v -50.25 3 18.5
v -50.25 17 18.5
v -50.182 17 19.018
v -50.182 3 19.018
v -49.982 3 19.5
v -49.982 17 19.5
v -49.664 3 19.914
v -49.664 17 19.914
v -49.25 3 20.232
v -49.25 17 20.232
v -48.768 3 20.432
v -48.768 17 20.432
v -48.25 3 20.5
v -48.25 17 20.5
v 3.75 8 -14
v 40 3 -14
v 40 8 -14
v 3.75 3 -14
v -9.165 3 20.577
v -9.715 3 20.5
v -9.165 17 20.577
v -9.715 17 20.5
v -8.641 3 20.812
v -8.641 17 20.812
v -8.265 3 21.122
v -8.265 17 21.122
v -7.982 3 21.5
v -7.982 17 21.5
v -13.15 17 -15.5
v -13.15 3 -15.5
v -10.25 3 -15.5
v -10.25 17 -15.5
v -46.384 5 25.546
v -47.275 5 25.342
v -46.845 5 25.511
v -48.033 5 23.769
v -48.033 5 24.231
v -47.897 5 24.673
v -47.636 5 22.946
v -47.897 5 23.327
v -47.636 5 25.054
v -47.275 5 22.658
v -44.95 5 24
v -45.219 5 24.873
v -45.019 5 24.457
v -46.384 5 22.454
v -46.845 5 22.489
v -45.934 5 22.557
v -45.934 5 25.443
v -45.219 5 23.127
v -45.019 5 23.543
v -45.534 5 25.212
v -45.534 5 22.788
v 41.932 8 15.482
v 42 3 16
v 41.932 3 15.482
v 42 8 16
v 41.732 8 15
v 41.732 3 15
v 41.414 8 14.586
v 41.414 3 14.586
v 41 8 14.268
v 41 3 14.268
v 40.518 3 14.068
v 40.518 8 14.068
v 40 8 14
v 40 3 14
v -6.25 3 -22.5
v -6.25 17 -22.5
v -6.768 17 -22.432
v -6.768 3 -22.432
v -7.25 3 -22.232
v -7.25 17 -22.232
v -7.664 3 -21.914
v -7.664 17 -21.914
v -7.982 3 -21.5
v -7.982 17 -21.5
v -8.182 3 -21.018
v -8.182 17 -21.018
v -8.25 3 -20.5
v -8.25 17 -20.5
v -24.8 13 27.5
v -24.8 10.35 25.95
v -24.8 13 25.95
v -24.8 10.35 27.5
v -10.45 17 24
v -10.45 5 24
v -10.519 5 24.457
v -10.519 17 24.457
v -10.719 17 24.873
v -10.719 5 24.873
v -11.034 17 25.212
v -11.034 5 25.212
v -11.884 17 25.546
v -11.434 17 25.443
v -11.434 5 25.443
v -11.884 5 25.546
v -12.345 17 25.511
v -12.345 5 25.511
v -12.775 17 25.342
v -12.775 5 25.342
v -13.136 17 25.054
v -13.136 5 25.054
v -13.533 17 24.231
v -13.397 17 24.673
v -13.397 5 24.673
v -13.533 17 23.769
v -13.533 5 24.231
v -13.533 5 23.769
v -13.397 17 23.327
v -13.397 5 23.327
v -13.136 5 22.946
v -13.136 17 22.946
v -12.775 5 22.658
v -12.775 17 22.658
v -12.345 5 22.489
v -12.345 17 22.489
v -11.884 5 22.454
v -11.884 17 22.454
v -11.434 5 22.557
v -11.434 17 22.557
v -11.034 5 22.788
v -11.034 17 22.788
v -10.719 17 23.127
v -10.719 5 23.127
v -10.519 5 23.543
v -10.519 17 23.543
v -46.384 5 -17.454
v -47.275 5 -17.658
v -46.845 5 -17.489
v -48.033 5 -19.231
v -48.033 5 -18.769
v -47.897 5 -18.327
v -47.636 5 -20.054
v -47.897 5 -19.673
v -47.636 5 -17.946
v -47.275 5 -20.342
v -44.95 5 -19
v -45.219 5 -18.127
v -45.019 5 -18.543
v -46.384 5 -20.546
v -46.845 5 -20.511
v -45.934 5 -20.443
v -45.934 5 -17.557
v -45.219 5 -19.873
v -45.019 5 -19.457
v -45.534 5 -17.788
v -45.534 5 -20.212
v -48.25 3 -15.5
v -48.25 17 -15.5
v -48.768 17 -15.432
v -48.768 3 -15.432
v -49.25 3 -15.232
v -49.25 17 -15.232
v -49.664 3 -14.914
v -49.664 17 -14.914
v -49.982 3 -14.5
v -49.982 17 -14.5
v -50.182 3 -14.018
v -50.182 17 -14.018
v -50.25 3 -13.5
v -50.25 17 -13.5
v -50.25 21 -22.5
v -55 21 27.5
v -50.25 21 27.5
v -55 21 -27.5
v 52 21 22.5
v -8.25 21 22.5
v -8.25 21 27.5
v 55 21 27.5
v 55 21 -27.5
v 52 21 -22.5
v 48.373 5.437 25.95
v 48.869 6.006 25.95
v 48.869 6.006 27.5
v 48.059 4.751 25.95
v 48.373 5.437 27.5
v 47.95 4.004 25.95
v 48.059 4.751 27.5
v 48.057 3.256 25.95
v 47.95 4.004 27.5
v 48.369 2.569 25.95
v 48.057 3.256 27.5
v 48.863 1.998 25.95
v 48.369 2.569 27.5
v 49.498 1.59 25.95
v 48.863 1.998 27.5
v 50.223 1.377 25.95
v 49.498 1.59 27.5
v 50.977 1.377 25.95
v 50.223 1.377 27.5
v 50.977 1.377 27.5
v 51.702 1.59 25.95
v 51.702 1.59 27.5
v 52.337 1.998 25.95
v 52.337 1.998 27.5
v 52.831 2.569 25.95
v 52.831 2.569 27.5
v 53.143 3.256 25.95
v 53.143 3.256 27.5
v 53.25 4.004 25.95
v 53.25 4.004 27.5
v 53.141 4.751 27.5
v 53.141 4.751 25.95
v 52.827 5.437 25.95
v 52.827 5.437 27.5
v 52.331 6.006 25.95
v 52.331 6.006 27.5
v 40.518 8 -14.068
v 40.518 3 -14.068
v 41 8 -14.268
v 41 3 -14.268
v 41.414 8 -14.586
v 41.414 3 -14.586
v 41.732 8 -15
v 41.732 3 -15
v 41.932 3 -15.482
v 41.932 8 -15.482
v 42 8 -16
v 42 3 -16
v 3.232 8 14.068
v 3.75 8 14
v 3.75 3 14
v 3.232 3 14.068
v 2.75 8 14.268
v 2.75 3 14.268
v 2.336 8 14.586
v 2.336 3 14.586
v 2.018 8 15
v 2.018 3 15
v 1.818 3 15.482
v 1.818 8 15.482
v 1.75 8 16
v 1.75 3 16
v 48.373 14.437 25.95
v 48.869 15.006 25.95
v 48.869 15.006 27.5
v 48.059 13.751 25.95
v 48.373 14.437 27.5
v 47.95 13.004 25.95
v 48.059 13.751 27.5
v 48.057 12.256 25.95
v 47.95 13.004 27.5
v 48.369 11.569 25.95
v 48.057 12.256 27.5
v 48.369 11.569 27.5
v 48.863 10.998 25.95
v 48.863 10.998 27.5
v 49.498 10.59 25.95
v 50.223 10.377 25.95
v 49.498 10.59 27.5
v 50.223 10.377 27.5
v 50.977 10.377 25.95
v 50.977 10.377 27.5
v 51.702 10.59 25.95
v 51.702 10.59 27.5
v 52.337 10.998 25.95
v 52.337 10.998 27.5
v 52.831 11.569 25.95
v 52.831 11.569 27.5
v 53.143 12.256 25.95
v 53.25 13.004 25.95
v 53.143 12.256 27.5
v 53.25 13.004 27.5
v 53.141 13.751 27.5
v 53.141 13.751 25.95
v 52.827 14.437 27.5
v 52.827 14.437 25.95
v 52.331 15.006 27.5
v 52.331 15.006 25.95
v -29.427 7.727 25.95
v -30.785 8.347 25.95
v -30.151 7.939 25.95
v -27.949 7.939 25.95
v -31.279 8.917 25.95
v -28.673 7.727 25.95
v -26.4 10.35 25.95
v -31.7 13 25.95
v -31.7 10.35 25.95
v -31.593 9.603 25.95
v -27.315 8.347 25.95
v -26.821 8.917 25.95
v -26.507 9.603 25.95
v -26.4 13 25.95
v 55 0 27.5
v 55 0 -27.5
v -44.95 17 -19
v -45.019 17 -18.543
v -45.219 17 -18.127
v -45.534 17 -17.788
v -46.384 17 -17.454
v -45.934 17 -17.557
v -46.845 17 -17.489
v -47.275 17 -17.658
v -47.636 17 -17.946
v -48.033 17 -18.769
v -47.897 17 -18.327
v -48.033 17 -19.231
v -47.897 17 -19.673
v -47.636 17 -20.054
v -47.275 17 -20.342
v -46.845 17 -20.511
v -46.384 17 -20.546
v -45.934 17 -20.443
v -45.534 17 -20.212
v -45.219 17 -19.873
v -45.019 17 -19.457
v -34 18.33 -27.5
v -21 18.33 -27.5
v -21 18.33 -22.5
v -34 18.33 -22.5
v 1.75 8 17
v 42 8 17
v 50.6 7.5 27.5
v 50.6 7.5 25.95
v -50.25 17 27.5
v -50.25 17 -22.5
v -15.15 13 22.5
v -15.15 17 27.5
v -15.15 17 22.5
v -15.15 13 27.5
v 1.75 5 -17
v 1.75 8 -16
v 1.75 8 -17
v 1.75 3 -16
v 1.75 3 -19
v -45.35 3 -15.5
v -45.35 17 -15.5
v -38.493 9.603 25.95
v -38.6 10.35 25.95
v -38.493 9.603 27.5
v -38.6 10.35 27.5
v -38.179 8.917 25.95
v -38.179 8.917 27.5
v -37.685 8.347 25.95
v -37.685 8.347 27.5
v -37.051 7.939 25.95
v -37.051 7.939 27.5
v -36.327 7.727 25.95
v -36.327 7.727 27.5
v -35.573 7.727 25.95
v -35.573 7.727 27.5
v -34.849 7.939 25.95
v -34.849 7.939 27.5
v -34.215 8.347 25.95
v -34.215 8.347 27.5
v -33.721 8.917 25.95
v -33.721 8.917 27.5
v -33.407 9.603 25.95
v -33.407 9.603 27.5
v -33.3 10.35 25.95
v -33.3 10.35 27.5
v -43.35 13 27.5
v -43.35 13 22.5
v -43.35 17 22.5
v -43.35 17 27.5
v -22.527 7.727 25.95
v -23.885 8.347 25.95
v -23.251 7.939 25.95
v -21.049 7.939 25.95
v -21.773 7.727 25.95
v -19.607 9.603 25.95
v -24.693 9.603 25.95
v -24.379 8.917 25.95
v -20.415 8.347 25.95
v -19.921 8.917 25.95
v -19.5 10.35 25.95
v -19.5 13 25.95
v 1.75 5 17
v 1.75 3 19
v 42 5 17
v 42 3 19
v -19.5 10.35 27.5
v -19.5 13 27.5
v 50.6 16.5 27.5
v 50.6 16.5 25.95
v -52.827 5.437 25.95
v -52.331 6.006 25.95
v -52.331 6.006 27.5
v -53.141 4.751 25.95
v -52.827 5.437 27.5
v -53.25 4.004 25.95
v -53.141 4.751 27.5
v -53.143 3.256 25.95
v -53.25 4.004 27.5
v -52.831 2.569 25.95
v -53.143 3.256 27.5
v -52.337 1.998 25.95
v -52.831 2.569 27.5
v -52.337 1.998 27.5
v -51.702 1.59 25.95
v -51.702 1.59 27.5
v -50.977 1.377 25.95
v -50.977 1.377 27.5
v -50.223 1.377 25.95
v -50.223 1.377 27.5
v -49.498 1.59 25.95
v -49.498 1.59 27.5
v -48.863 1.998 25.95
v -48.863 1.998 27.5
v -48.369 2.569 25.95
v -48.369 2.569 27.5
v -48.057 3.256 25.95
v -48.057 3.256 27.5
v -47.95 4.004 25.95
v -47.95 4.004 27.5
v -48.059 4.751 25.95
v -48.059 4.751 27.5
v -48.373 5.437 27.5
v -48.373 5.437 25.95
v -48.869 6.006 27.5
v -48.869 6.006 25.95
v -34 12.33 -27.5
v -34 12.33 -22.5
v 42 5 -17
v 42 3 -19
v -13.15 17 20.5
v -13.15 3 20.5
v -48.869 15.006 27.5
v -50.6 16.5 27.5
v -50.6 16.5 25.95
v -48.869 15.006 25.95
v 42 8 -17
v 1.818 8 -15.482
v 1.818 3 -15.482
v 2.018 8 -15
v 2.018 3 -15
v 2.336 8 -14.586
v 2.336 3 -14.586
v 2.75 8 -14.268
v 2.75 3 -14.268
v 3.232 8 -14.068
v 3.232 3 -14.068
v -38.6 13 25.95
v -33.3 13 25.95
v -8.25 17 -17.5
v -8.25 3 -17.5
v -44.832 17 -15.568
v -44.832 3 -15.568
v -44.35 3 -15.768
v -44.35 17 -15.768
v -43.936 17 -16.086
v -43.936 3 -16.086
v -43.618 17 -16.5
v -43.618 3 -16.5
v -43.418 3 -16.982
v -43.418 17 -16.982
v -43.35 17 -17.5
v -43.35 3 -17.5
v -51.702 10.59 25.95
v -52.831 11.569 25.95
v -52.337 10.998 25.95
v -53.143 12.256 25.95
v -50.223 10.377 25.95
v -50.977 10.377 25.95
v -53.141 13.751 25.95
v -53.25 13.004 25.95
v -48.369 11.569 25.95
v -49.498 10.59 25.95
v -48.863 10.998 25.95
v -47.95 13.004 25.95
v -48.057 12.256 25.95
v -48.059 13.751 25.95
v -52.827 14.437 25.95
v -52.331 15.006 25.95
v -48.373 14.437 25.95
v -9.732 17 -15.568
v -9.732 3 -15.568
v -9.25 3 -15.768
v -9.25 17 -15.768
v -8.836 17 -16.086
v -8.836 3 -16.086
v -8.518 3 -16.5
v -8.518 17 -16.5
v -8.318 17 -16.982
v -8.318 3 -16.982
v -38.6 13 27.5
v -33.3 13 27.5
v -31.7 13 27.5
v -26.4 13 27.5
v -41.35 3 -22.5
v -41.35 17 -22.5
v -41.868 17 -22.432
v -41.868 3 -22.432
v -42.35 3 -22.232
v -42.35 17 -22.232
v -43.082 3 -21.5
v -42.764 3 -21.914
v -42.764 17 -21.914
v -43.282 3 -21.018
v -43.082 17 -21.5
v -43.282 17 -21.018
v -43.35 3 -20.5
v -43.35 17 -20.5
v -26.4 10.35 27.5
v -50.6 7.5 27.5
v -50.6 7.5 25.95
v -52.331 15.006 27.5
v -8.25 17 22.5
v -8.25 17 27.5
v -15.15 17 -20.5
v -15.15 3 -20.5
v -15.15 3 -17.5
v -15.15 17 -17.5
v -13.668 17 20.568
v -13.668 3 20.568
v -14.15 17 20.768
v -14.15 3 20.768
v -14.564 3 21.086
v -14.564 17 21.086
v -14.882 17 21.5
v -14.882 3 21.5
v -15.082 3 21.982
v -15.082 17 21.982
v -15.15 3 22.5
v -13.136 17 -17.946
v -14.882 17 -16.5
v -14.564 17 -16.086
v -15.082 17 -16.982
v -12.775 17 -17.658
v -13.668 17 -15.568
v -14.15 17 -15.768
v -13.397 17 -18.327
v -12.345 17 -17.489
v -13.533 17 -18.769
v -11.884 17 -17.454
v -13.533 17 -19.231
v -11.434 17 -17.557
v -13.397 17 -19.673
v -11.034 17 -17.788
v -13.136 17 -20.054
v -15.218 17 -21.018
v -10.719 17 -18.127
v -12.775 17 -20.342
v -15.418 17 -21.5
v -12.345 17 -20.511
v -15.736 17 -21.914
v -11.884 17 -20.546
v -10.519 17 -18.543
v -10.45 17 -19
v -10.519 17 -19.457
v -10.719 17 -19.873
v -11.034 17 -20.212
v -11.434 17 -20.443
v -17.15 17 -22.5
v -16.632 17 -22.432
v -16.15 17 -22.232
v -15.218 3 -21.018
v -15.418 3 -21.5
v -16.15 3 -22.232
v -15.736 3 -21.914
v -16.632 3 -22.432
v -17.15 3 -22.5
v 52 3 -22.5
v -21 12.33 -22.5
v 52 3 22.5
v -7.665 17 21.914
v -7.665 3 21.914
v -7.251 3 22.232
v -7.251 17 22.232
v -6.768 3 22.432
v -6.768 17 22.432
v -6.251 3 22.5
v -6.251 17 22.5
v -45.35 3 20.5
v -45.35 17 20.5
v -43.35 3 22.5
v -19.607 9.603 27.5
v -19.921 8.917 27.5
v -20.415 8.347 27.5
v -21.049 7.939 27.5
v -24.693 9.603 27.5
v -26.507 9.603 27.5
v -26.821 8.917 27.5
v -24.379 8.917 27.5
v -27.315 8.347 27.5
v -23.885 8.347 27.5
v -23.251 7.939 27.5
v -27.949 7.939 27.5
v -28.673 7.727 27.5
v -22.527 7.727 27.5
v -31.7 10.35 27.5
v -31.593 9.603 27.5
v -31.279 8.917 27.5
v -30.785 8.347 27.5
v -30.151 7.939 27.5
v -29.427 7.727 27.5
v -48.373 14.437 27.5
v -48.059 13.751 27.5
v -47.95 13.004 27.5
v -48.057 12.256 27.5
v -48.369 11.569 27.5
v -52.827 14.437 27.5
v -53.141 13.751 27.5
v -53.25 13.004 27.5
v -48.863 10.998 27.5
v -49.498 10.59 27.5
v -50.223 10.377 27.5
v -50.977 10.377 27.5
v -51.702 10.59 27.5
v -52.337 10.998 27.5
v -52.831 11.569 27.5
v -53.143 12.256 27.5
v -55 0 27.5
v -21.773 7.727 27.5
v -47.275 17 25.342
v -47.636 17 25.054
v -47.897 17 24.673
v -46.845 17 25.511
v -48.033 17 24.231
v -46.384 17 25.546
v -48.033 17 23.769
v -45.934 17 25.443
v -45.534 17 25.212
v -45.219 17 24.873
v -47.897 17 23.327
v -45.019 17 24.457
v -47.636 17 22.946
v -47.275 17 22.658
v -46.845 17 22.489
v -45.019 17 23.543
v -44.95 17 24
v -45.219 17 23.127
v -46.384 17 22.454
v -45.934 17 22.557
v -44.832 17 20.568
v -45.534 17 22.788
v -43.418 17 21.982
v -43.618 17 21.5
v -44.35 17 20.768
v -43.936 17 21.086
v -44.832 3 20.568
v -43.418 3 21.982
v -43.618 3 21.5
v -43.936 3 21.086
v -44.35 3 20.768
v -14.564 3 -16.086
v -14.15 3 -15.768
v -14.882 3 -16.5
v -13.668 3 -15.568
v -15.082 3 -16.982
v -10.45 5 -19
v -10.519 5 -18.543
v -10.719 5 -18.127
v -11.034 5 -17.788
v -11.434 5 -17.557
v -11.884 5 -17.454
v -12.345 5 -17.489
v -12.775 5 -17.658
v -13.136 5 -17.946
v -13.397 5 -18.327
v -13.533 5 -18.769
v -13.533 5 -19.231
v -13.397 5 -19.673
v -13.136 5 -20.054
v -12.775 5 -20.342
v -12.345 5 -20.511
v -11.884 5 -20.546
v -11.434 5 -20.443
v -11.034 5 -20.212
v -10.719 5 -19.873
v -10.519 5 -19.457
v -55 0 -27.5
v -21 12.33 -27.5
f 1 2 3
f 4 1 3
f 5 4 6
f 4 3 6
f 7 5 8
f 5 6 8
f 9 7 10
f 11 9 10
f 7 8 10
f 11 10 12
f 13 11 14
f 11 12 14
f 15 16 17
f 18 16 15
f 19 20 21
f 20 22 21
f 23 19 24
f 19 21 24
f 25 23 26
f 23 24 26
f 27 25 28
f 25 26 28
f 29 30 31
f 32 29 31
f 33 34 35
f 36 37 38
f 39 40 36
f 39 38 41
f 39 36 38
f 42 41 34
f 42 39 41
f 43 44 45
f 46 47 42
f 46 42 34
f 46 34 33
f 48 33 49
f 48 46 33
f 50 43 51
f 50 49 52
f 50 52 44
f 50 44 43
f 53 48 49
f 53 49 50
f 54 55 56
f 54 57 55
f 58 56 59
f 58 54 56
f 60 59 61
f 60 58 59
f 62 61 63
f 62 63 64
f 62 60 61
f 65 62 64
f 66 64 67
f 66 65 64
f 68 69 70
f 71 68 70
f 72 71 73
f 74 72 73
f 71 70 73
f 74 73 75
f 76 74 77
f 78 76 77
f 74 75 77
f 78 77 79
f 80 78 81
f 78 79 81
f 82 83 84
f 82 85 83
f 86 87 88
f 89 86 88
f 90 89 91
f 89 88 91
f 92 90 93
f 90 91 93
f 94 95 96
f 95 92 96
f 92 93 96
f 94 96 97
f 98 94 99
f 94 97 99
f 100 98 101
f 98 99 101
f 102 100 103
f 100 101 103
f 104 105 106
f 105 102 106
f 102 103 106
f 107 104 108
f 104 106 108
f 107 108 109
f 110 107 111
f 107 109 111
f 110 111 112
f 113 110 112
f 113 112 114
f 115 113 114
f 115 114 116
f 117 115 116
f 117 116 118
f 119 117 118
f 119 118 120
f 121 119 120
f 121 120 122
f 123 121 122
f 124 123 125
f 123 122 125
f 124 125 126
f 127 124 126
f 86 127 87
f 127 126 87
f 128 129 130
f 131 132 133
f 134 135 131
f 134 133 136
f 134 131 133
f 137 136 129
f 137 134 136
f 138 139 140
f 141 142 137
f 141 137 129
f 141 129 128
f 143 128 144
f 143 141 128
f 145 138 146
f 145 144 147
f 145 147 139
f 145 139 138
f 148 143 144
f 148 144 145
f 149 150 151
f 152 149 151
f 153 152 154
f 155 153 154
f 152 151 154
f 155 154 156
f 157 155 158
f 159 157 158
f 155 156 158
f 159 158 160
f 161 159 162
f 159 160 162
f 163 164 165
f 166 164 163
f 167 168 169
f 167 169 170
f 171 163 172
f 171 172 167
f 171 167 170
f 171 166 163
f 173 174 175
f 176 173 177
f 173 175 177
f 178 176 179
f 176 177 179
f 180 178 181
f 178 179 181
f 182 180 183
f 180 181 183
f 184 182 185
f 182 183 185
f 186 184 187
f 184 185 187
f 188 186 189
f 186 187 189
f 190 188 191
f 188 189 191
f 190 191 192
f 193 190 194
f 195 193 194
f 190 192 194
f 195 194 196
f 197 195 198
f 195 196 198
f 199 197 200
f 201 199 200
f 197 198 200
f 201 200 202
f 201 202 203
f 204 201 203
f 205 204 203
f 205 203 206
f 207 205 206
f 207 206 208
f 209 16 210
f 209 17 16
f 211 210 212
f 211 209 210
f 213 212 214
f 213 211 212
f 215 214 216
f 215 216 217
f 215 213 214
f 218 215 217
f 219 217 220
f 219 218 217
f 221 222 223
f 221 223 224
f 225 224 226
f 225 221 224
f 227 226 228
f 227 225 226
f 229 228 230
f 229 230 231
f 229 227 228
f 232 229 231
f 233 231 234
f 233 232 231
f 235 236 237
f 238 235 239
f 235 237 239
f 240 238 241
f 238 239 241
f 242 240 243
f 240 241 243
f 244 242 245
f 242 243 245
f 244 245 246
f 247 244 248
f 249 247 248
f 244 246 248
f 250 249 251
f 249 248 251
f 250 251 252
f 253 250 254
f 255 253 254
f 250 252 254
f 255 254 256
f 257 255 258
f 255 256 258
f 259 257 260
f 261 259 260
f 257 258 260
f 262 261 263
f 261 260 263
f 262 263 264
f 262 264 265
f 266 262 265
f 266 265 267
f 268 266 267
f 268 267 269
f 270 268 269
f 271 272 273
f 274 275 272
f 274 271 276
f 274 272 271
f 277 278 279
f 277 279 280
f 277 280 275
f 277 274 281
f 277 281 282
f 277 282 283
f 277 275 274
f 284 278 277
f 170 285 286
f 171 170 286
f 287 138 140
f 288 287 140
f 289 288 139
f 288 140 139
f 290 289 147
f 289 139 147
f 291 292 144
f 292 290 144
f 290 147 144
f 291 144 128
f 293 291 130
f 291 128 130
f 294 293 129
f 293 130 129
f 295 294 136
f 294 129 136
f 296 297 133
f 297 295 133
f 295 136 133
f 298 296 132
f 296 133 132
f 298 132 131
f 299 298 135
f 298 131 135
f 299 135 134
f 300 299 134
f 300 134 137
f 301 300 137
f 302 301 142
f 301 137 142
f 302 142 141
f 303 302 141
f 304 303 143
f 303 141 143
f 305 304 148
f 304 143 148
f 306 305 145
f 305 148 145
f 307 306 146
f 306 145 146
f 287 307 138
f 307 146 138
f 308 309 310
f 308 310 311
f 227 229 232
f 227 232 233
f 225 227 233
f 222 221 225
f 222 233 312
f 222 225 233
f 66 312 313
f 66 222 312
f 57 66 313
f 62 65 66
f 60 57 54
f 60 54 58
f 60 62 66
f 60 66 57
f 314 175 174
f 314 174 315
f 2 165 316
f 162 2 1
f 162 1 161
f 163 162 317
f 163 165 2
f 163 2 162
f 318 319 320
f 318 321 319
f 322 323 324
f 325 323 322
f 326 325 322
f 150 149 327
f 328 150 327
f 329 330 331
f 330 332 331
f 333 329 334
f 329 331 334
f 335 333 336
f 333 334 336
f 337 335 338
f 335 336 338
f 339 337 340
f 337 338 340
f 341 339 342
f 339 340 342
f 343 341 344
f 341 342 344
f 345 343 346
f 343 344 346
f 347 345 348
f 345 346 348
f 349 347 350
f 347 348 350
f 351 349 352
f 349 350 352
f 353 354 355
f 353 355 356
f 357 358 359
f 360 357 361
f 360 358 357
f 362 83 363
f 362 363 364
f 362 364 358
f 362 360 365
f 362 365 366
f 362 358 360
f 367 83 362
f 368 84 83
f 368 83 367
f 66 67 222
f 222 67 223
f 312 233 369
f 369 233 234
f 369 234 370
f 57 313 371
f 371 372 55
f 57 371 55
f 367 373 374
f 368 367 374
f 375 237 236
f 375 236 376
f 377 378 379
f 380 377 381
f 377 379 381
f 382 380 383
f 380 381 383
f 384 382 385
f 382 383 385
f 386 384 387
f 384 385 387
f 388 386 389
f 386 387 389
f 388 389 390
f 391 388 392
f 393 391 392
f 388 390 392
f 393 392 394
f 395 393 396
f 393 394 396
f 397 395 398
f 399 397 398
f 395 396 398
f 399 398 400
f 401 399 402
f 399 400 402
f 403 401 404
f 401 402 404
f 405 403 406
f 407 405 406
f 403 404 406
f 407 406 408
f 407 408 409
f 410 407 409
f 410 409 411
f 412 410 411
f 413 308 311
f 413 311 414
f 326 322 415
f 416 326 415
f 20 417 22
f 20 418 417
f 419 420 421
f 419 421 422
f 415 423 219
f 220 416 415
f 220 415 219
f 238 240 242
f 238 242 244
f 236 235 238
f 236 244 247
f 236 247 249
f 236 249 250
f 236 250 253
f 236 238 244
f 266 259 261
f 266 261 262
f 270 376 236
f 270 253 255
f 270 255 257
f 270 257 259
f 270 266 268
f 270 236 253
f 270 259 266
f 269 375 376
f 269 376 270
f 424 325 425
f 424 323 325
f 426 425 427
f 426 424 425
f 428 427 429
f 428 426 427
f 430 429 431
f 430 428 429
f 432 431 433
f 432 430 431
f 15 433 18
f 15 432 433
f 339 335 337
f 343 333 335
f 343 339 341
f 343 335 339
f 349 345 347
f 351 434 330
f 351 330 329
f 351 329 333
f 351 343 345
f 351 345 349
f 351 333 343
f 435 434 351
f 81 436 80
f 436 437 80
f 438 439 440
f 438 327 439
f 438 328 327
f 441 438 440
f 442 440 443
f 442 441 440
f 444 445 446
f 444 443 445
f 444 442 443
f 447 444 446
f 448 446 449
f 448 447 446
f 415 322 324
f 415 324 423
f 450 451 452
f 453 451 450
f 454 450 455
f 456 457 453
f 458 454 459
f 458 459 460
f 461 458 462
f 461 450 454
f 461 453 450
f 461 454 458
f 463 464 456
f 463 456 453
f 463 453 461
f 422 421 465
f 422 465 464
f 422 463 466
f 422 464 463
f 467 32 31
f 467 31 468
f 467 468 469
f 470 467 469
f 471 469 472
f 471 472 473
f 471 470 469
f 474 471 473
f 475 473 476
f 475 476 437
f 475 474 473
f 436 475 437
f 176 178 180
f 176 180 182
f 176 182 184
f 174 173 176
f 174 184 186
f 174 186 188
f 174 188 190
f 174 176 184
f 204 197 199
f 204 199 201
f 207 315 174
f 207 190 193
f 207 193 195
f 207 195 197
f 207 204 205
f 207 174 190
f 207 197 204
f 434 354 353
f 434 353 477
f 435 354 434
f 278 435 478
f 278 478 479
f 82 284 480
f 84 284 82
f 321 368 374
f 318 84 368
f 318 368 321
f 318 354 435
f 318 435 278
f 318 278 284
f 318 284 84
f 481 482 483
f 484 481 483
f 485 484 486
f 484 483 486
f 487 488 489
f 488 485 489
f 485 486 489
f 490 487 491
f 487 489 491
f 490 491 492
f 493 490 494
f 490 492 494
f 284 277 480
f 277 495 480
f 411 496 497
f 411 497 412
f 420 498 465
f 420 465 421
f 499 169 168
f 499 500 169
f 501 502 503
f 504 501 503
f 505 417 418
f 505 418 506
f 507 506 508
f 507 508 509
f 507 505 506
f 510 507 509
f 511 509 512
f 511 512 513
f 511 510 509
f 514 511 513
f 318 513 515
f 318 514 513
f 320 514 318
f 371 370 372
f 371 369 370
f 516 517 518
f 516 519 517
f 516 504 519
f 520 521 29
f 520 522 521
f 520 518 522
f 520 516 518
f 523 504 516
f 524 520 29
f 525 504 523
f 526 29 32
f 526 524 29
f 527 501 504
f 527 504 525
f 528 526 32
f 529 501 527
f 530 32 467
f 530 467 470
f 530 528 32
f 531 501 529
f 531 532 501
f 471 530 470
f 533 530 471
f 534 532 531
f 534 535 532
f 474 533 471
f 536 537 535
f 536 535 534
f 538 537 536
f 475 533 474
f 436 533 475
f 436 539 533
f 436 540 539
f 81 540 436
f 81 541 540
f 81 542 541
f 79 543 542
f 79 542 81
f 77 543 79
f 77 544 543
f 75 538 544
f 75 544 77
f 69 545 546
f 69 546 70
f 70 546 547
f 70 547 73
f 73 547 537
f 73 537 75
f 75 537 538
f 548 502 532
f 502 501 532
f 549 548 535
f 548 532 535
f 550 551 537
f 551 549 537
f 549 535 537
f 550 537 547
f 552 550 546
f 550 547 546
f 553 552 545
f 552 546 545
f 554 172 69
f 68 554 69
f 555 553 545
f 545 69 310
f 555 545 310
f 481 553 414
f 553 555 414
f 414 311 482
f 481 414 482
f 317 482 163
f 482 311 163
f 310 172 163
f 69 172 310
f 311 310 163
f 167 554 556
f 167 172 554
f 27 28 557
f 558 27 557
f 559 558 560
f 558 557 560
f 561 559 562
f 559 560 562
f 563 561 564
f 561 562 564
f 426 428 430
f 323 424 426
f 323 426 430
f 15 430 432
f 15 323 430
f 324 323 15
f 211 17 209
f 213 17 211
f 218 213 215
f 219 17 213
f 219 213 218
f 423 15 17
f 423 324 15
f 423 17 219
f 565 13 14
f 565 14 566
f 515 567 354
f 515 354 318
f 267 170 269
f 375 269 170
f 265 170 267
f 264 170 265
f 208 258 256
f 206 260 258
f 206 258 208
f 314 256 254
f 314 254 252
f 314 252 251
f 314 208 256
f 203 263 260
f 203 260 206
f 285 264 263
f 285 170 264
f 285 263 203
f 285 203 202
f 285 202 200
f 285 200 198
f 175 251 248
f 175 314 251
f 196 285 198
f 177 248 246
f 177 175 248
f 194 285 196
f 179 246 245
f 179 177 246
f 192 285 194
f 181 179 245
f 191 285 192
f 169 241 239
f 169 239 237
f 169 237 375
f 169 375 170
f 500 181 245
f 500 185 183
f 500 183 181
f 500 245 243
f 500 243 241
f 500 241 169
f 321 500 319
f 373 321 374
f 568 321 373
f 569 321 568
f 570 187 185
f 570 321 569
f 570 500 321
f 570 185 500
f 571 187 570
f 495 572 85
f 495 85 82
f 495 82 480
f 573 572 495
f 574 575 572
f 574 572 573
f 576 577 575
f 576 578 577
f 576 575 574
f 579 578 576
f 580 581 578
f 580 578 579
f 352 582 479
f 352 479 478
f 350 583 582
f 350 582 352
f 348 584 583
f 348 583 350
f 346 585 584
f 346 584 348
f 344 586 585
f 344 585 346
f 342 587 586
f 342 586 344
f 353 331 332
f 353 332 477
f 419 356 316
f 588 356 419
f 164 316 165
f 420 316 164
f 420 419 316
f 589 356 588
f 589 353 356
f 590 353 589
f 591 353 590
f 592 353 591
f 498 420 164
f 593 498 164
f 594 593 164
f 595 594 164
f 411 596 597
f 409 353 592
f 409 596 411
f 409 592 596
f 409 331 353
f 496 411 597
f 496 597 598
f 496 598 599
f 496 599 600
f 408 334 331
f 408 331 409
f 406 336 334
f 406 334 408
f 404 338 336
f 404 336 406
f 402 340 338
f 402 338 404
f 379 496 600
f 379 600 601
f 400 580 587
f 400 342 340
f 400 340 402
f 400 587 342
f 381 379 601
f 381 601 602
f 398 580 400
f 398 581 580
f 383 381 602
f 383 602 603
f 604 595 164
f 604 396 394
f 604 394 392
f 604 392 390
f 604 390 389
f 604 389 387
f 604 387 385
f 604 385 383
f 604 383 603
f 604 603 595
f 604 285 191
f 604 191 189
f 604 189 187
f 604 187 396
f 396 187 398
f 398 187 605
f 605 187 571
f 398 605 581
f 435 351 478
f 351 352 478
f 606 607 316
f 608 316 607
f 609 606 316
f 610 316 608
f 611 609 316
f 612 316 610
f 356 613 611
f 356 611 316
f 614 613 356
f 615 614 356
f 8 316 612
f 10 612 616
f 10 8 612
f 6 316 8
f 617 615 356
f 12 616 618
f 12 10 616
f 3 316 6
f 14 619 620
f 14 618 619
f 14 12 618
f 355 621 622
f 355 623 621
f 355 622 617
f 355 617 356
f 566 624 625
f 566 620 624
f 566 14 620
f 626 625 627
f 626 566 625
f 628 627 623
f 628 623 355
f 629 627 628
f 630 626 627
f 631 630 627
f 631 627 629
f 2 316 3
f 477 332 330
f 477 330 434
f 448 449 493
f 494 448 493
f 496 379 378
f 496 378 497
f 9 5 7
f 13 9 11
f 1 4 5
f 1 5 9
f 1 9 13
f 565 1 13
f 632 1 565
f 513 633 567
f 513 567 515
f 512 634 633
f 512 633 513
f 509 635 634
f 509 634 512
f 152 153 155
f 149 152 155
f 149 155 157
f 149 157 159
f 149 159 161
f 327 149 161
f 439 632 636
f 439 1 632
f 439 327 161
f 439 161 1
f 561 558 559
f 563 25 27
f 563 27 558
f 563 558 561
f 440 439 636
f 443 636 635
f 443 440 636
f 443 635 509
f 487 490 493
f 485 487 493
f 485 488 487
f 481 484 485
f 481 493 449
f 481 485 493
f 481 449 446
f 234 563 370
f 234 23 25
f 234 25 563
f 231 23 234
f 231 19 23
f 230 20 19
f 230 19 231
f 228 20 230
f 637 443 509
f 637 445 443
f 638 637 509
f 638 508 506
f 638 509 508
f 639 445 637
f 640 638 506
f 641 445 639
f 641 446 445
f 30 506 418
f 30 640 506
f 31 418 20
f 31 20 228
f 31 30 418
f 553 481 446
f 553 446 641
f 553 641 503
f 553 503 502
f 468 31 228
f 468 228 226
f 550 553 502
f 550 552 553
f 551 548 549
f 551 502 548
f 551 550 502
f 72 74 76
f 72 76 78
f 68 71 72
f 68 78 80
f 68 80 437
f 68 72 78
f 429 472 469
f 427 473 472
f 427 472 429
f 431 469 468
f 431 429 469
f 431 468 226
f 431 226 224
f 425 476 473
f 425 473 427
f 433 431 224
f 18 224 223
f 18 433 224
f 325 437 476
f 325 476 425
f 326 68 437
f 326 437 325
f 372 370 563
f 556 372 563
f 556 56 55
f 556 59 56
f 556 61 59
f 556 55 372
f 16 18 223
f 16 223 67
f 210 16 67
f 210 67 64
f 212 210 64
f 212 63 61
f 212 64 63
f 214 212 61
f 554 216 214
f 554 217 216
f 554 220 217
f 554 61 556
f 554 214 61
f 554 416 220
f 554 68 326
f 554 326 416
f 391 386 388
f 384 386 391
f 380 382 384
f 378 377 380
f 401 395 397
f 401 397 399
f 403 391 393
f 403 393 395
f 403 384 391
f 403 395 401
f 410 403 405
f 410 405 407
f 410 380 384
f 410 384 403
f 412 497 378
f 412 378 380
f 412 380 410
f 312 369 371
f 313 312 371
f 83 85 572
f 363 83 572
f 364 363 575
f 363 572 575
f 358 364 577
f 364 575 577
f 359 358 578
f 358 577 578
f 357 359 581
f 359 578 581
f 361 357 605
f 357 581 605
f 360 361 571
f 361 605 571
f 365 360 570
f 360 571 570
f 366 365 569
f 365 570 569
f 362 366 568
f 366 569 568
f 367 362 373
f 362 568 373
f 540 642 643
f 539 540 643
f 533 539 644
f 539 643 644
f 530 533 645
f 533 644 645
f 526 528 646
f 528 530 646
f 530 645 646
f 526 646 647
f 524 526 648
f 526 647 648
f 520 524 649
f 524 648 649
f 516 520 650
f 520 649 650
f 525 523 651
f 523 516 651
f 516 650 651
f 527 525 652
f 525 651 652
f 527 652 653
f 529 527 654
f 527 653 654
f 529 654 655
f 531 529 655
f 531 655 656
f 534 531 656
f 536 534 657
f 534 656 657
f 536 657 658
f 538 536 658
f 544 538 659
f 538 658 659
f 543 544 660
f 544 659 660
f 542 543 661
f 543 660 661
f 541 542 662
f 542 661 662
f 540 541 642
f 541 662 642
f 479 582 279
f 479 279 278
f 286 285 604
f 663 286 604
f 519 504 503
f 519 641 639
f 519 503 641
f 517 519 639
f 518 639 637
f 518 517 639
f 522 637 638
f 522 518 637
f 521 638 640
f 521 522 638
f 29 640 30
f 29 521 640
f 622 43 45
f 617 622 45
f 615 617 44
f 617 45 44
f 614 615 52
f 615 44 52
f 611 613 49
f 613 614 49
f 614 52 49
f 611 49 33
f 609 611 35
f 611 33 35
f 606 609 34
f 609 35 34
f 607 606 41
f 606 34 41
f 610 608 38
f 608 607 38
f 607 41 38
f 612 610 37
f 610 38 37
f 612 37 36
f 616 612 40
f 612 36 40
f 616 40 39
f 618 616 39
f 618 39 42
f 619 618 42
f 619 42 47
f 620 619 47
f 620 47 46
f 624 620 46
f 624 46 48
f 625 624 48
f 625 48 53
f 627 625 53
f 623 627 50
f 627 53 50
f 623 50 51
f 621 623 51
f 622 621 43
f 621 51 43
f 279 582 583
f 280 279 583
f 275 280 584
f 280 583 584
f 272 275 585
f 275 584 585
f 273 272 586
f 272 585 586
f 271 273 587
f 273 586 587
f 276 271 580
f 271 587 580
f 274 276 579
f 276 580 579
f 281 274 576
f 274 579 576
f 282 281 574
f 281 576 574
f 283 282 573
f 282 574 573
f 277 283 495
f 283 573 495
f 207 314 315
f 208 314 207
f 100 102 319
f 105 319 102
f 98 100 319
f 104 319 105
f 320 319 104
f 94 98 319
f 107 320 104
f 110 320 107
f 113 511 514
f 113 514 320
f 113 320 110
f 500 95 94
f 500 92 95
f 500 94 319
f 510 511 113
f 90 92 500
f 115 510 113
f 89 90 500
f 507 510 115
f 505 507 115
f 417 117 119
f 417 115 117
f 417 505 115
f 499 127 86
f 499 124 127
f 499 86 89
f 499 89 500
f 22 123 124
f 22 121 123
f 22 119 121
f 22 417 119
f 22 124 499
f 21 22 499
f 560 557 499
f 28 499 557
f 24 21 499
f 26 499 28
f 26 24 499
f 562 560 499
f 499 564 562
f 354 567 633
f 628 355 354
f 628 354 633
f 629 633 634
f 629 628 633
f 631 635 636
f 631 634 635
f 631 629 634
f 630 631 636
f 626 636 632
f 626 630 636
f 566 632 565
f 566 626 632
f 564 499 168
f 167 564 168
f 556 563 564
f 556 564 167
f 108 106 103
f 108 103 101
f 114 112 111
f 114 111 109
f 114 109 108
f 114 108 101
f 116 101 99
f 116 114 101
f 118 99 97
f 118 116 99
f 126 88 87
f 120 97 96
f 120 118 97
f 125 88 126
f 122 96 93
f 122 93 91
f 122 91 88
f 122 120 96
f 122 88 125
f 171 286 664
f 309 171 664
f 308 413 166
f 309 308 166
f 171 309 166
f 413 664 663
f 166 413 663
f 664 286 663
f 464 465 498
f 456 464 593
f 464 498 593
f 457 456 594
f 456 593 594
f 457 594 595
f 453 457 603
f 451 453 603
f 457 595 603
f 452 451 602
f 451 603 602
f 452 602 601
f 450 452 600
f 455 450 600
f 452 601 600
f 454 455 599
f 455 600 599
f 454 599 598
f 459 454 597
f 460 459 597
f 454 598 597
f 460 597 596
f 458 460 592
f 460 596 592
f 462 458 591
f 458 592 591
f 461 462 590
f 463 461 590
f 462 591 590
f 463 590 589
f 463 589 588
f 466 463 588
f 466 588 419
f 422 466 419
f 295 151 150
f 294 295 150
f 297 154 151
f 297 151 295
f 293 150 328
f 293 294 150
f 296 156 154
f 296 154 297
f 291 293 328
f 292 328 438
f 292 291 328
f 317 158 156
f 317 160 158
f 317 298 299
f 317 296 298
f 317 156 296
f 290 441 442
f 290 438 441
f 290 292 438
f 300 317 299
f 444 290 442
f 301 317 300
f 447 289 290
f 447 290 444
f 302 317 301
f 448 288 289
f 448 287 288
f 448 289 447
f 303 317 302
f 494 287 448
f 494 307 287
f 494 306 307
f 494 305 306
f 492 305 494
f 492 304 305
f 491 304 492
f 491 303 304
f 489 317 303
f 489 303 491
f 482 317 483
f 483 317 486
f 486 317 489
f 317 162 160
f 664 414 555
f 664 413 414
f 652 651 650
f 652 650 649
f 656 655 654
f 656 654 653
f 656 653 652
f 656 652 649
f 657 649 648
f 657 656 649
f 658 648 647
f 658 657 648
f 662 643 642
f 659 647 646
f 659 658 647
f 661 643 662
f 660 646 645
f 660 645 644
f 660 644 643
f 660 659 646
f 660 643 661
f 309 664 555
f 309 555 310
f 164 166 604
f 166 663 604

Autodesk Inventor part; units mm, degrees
ref_plane "YZ Plane" through (0, 0, 0) normal (1, 0, 0) x (0, 1, 0)
ref_plane "XZ Plane" through (0, 0, 0) normal (0, 1, 0) x (-1, 0, 0)
ref_plane "XY Plane" through (0, 0, 0) normal (0, 0, 1) x (1, 0, 0)
sketch "Sketch1" plane through (0, 0, 0) normal (0, 1, 0) x (-1, 0, 0)
  line L0 (55, 27.5) -> (-55, 27.5)
  line L1 (-55, 27.5) -> (-55, -27.5)
  line L2 (-55, -27.5) -> (55, -27.5)
  line L3 (55, -27.5) -> (55, 27.5)
  point P0 (0, 0)
  point P1 (-55, 0)
  point P2 (55, 0)
  dimension "d0" = 55
  dimension "d66" = 27.5
  dimension "d67" = 55
  dimension "d68" = 55
extrude "Extrusion1" add sketch "Sketch1" along normal blind 21
sketch "Sketch2" plane through (0, 21, 0) normal (0, 1, 0) x (1, 0, 0)
  line L0 (-55, -27.5) -> (55, -27.5) projected
  line L1 (55, 27.5) -> (-55, 27.5) projected
  line L2 (52, -27.5) -> (-50.25, -27.5)
  line L3 (-50.25, -27.5) -> (-50.25, 27.5)
  line L4 (-50.25, 27.5) -> (52, 27.5)
  line L5 (52, 27.5) -> (52, -27.5)
  line L6 (-55, 27.5) -> (-55, -27.5) projected
  line L7 (55, -27.5) -> (55, 27.5) projected
  line L8 (-50.25, 27.5) -> (52, 27.5)
  line L9 (52, 27.5) -> (52, 22.5)
  line L10 (52, 22.5) -> (-50.25, 22.5)
  line L11 (-50.25, 22.5) -> (-50.25, 27.5)
  point P0 (0, 0)
  point P1 (52, 27.5)
  point P2 (-50.25, -27.5)
  point P3 (-50.25, 22.5)
  dimension "d122" = 50.25
  dimension "d333" = 5
  dimension "d338" = 52
  dimension "d354" = 102.25
extrude "Extrusion2" cut sketch "Sketch2" against normal blind 18 contours L3 L10 L5 L0
sketch "Sketch11" plane through (0, 3, 0) normal (0, 1, 0) x (1, 0, 0)
  circle A0 centre (-12, 19) radius 1.55
  circle A1 centre (-12, -24) radius 1.55
  circle A2 centre (-46.5, 19) radius 1.55
  line L0 (-50.25, -27.5) -> (-50.25, 22.5) projected
  circle A3 centre (-46.5, -24) radius 1.55
  line L1 (52, -27.5) -> (-50.25, -27.5) projected
  line L2 (-50.25, 22.5) -> (52, 22.5) projected
  line L3 (-43.35, 22.5) -> (-50.25, 22.5)
  line L4 (-50.25, 22.5) -> (-50.25, 15.5)
  line L5 (-50.25, 15.5) -> (-43.35, 15.5)
  line L6 (-43.35, 15.5) -> (-43.35, 22.5)
  line L7 (-50.25, -20.5) -> (-43.35, -20.5)
  line L8 (-43.35, -20.5) -> (-43.35, -27.5)
  line L9 (-43.35, -27.5) -> (-50.25, -27.5)
  line L10 (-50.25, -27.5) -> (-50.25, -20.5)
  line L11 (-8.25, -27.5) -> (-15.15, -27.5)
  line L12 (-15.15, -27.5) -> (-15.15, -20.5)
  line L13 (-15.15, -20.5) -> (-8.25, -20.5)
  line L14 (-8.25, -20.5) -> (-8.25, -27.5)
  line L15 (-8.25, 22.5) -> (-15.15, 22.5)
  line L16 (-15.15, 22.5) -> (-15.15, 15.5)
  line L17 (-15.15, 15.5) -> (-8.25, 15.5)
  line L18 (-8.25, 15.5) -> (-8.25, 22.5)
  point P0 (-15.15, 22.5)
  dimension "d340" = 34.5
  dimension "d419" = 3.1
  dimension "d423" = 3.75
  dimension "d424" = 43
  dimension "d425" = 3.5
  dimension "d430" = 6.9
  dimension "d431" = 7
  dimension "d432" = 3.75
extrude "Extrusion17" add sketch "Sketch11" along normal blind 14
sketch "Sketch20" plane through (0, 3, 0) normal (0, 1, 0) x (1, 0, 0)
  line L0 (-50.25, -20.5) -> (-50.25, 22.5) projected
  line L1 (-8.25, -27.5) -> (-8.25, -20.5) projected
  line L2 (-8.25, -22.5) -> (52, -22.5)
  line L3 (52, -27.5) -> (-8.25, -27.5) projected
  line L4 (52, 22.5) -> (52, -27.5) projected
  point P0 (0, 0)
  point P1 (-50.25, -22.5)
  dimension "d439" = 5
extrude "Extrusion25" add sketch "Sketch20" along normal up to surface (18 mm away)
sketch "Sketch21" plane through (0, 3, 0) normal (0, 1, 0) x (1, 0, 0)
  line L0 (-43.35, -22.5) -> (-15.15, -22.5)
  line L1 (-15.15, -27.5) -> (-43.35, -27.5) projected
  line L2 (-43.35, -27.5) -> (-43.35, -20.5) projected
  line L3 (-15.15, -20.5) -> (-15.15, -27.5) projected
  point P0 (0, 0)
  dimension "d440" = 5
extrude "Extrusion19" add sketch "Sketch21" along normal blind 10
fillet "Fillet7" radius 2 12 edges at (-8.25, 10, -15.5) (-15.15, 10, -15.5) (-15.15, 10, 20.5) (-8.25, 10, 20.5) (-43.35, 10, 20.5) (-43.35, 10, -15.5) (-43.35, 10, -22.5) (-50.25, 10, -15.5) (-15.15, 10, -22.5) (-50.25, 10, 20.5) (-8.25, 10, -22.5) (-8.25, 10, 22.5)
sketch "Sketch23" plane through (0, 3, 0) normal (0, 1, 0) x (1, 0, 0)
  line L0 (1.75, 17) -> (42, 17)
  line L1 (42, 17) -> (42, 14)
  line L2 (42, 14) -> (1.75, 14)
  line L3 (1.75, 14) -> (1.75, 17)
  line L4 (42, -14) -> (1.75, -14)
  line L5 (1.75, -14) -> (1.75, -17)
  line L6 (1.75, -17) -> (42, -17)
  line L7 (42, -17) -> (42, -14)
  line L8 (-50.25, -27.5) -> (-50.25, 22.5) projected
  line L9 (-50.25, 22.5) -> (52, 22.5) projected
  line L10 (52, 22.5) -> (52, -22.5) projected
  line L11 (-8.25, 17.5) -> (-8.25, 20.5) projected
  line L12 (0, 0) -> (40.25, 0)
  point P0 (21.875, -14)
  point P1 (21.875, 14)
  point P2 (-52, -22.5)
  point P3 (1.75, 15.5)
  point P4 (42, 15.5)
  point P5 (21.875, -17)
  point P6 (50.25, -27.5)
  point P7 (-10.3, 15.5)
  point P8 (-8.55, 22.5)
  dimension "d375" = 3
  dimension "d380" = 3
  dimension "d433" = 10
  dimension "d434" = 10
  dimension "d438" = 28
extrude "Extrusion21" add sketch "Sketch23" along normal blind 5
fillet "Fillet8" radius 2 4 edges at (1.75, 5.5, -14) (42, 5.5, -14) (42, 5.5, 14) (1.75, 5.5, 14)
chamfer "Chamfer33" distance 2 angle 45 2 edges at (21.875, 3, 17) (21.875, 3, -17)
sketch "Sketch25" plane through (55, 0, -27.5) normal (0, 0, -1) x (-1, 0, 0)
  line L0 (76, 18.33) -> (89, 18.33)
  line L1 (89, 18.33) -> (89, 12.33)
  line L2 (89, 12.33) -> (76, 12.33)
  line L3 (76, 12.33) -> (76, 18.33)
  line L4 (110, 0) -> (110, 21) projected
  line L5 (0, 21) -> (110, 21) projected
  dimension "d411" = 6
  dimension "d412" = 13
  dimension "d447" = 21
  dimension "d448" = 2.67
extrude "Extrusion23" cut sketch "Sketch25" against normal up to surface (5 mm away)
sketch "Sketch24" plane through (-55, 0, 27.5) normal (0, 0, 1) x (1, 0, 0)
  circle A0 centre (105.6, 13) radius 2.65
  circle A1 centre (4.4, 13) radius 2.65
  circle A2 centre (105.6, 4) radius 2.65
  circle A3 centre (4.4, 4) radius 2.65
  line L0 (2.6689, 15.0064) -> (4.4, 16.5)
  line L1 (4.4, 16.5) -> (6.1311, 15.0064)
  line L2 (2.6689, 6.0064) -> (4.4, 7.5)
  line L3 (4.4, 7.5) -> (6.1311, 6.0064)
  line L4 (103.8689, 6.0064) -> (105.6, 7.5)
  line L5 (105.6, 7.5) -> (107.3311, 6.0064)
  line L6 (103.8689, 15.0064) -> (105.6, 16.5)
  line L7 (105.6, 16.5) -> (107.3311, 15.0064)
  line L8 (0, 0) -> (110, 0) projected
  line L9 (0, 0) -> (0, 21) projected
  line L10 (110, 0) -> (110, 21) projected
  circle A4 centre (19.05, 10.35) radius 2.65
  circle A5 centre (25.95, 10.35) radius 2.65
  circle A6 centre (32.85, 10.35) radius 2.65
  line L11 (11.65, 13) -> (39.85, 13) projected
  line L12 (16.4, 10.35) -> (16.4, 13)
  line L13 (21.7, 10.35) -> (21.7, 13)
  line L14 (23.3, 10.35) -> (23.3, 13)
  line L15 (28.6, 10.35) -> (28.6, 13)
  line L16 (30.2, 10.35) -> (30.2, 13)
  line L17 (35.5, 10.35) -> (35.5, 13)
  line L18 (4.75, 17) -> (11.65, 17) projected
  point P0 (55, 0)
  point P1 (20.0625, -1.6972)
  point P2 (19.05, 13)
  dimension "d391" = 5.3
  dimension "d399" = 3.5
  dimension "d409" = 4.4
  dimension "d410" = 4.4
  dimension "d450" = 6.9
  dimension "d451" = 6.9
  dimension "d452" = 2.65
  dimension "d453" = 4
  dimension "d454" = 19.05
  dimension "d455" = 9
extrude "Extrusion22" cut sketch "Sketch24" against normal blind 1.55
sketch "Sketch28" plane through (0, 3, 0) normal (0, 1, 0) x (1, 0, 0)
  circle A0 centre (-46.5, 19) radius 1.55
  circle A1 centre (-12, 19) radius 1.55
  circle A2 centre (-12, -24) radius 1.55
  circle A3 centre (-46.5, -24) radius 1.55
  circle A4 centre (-46.5, -24) radius 1.55 projected
  circle A5 centre (-12, -24) radius 1.55 projected
  circle A6 centre (-12, 19) radius 1.55 projected
  circle A7 centre (-46.5, 19) radius 1.55 projected
  point P0 (0, 0)
extrude "Extrusion26" add sketch "Sketch28" along normal blind 2
properties part number "PowerModuleHousing"
